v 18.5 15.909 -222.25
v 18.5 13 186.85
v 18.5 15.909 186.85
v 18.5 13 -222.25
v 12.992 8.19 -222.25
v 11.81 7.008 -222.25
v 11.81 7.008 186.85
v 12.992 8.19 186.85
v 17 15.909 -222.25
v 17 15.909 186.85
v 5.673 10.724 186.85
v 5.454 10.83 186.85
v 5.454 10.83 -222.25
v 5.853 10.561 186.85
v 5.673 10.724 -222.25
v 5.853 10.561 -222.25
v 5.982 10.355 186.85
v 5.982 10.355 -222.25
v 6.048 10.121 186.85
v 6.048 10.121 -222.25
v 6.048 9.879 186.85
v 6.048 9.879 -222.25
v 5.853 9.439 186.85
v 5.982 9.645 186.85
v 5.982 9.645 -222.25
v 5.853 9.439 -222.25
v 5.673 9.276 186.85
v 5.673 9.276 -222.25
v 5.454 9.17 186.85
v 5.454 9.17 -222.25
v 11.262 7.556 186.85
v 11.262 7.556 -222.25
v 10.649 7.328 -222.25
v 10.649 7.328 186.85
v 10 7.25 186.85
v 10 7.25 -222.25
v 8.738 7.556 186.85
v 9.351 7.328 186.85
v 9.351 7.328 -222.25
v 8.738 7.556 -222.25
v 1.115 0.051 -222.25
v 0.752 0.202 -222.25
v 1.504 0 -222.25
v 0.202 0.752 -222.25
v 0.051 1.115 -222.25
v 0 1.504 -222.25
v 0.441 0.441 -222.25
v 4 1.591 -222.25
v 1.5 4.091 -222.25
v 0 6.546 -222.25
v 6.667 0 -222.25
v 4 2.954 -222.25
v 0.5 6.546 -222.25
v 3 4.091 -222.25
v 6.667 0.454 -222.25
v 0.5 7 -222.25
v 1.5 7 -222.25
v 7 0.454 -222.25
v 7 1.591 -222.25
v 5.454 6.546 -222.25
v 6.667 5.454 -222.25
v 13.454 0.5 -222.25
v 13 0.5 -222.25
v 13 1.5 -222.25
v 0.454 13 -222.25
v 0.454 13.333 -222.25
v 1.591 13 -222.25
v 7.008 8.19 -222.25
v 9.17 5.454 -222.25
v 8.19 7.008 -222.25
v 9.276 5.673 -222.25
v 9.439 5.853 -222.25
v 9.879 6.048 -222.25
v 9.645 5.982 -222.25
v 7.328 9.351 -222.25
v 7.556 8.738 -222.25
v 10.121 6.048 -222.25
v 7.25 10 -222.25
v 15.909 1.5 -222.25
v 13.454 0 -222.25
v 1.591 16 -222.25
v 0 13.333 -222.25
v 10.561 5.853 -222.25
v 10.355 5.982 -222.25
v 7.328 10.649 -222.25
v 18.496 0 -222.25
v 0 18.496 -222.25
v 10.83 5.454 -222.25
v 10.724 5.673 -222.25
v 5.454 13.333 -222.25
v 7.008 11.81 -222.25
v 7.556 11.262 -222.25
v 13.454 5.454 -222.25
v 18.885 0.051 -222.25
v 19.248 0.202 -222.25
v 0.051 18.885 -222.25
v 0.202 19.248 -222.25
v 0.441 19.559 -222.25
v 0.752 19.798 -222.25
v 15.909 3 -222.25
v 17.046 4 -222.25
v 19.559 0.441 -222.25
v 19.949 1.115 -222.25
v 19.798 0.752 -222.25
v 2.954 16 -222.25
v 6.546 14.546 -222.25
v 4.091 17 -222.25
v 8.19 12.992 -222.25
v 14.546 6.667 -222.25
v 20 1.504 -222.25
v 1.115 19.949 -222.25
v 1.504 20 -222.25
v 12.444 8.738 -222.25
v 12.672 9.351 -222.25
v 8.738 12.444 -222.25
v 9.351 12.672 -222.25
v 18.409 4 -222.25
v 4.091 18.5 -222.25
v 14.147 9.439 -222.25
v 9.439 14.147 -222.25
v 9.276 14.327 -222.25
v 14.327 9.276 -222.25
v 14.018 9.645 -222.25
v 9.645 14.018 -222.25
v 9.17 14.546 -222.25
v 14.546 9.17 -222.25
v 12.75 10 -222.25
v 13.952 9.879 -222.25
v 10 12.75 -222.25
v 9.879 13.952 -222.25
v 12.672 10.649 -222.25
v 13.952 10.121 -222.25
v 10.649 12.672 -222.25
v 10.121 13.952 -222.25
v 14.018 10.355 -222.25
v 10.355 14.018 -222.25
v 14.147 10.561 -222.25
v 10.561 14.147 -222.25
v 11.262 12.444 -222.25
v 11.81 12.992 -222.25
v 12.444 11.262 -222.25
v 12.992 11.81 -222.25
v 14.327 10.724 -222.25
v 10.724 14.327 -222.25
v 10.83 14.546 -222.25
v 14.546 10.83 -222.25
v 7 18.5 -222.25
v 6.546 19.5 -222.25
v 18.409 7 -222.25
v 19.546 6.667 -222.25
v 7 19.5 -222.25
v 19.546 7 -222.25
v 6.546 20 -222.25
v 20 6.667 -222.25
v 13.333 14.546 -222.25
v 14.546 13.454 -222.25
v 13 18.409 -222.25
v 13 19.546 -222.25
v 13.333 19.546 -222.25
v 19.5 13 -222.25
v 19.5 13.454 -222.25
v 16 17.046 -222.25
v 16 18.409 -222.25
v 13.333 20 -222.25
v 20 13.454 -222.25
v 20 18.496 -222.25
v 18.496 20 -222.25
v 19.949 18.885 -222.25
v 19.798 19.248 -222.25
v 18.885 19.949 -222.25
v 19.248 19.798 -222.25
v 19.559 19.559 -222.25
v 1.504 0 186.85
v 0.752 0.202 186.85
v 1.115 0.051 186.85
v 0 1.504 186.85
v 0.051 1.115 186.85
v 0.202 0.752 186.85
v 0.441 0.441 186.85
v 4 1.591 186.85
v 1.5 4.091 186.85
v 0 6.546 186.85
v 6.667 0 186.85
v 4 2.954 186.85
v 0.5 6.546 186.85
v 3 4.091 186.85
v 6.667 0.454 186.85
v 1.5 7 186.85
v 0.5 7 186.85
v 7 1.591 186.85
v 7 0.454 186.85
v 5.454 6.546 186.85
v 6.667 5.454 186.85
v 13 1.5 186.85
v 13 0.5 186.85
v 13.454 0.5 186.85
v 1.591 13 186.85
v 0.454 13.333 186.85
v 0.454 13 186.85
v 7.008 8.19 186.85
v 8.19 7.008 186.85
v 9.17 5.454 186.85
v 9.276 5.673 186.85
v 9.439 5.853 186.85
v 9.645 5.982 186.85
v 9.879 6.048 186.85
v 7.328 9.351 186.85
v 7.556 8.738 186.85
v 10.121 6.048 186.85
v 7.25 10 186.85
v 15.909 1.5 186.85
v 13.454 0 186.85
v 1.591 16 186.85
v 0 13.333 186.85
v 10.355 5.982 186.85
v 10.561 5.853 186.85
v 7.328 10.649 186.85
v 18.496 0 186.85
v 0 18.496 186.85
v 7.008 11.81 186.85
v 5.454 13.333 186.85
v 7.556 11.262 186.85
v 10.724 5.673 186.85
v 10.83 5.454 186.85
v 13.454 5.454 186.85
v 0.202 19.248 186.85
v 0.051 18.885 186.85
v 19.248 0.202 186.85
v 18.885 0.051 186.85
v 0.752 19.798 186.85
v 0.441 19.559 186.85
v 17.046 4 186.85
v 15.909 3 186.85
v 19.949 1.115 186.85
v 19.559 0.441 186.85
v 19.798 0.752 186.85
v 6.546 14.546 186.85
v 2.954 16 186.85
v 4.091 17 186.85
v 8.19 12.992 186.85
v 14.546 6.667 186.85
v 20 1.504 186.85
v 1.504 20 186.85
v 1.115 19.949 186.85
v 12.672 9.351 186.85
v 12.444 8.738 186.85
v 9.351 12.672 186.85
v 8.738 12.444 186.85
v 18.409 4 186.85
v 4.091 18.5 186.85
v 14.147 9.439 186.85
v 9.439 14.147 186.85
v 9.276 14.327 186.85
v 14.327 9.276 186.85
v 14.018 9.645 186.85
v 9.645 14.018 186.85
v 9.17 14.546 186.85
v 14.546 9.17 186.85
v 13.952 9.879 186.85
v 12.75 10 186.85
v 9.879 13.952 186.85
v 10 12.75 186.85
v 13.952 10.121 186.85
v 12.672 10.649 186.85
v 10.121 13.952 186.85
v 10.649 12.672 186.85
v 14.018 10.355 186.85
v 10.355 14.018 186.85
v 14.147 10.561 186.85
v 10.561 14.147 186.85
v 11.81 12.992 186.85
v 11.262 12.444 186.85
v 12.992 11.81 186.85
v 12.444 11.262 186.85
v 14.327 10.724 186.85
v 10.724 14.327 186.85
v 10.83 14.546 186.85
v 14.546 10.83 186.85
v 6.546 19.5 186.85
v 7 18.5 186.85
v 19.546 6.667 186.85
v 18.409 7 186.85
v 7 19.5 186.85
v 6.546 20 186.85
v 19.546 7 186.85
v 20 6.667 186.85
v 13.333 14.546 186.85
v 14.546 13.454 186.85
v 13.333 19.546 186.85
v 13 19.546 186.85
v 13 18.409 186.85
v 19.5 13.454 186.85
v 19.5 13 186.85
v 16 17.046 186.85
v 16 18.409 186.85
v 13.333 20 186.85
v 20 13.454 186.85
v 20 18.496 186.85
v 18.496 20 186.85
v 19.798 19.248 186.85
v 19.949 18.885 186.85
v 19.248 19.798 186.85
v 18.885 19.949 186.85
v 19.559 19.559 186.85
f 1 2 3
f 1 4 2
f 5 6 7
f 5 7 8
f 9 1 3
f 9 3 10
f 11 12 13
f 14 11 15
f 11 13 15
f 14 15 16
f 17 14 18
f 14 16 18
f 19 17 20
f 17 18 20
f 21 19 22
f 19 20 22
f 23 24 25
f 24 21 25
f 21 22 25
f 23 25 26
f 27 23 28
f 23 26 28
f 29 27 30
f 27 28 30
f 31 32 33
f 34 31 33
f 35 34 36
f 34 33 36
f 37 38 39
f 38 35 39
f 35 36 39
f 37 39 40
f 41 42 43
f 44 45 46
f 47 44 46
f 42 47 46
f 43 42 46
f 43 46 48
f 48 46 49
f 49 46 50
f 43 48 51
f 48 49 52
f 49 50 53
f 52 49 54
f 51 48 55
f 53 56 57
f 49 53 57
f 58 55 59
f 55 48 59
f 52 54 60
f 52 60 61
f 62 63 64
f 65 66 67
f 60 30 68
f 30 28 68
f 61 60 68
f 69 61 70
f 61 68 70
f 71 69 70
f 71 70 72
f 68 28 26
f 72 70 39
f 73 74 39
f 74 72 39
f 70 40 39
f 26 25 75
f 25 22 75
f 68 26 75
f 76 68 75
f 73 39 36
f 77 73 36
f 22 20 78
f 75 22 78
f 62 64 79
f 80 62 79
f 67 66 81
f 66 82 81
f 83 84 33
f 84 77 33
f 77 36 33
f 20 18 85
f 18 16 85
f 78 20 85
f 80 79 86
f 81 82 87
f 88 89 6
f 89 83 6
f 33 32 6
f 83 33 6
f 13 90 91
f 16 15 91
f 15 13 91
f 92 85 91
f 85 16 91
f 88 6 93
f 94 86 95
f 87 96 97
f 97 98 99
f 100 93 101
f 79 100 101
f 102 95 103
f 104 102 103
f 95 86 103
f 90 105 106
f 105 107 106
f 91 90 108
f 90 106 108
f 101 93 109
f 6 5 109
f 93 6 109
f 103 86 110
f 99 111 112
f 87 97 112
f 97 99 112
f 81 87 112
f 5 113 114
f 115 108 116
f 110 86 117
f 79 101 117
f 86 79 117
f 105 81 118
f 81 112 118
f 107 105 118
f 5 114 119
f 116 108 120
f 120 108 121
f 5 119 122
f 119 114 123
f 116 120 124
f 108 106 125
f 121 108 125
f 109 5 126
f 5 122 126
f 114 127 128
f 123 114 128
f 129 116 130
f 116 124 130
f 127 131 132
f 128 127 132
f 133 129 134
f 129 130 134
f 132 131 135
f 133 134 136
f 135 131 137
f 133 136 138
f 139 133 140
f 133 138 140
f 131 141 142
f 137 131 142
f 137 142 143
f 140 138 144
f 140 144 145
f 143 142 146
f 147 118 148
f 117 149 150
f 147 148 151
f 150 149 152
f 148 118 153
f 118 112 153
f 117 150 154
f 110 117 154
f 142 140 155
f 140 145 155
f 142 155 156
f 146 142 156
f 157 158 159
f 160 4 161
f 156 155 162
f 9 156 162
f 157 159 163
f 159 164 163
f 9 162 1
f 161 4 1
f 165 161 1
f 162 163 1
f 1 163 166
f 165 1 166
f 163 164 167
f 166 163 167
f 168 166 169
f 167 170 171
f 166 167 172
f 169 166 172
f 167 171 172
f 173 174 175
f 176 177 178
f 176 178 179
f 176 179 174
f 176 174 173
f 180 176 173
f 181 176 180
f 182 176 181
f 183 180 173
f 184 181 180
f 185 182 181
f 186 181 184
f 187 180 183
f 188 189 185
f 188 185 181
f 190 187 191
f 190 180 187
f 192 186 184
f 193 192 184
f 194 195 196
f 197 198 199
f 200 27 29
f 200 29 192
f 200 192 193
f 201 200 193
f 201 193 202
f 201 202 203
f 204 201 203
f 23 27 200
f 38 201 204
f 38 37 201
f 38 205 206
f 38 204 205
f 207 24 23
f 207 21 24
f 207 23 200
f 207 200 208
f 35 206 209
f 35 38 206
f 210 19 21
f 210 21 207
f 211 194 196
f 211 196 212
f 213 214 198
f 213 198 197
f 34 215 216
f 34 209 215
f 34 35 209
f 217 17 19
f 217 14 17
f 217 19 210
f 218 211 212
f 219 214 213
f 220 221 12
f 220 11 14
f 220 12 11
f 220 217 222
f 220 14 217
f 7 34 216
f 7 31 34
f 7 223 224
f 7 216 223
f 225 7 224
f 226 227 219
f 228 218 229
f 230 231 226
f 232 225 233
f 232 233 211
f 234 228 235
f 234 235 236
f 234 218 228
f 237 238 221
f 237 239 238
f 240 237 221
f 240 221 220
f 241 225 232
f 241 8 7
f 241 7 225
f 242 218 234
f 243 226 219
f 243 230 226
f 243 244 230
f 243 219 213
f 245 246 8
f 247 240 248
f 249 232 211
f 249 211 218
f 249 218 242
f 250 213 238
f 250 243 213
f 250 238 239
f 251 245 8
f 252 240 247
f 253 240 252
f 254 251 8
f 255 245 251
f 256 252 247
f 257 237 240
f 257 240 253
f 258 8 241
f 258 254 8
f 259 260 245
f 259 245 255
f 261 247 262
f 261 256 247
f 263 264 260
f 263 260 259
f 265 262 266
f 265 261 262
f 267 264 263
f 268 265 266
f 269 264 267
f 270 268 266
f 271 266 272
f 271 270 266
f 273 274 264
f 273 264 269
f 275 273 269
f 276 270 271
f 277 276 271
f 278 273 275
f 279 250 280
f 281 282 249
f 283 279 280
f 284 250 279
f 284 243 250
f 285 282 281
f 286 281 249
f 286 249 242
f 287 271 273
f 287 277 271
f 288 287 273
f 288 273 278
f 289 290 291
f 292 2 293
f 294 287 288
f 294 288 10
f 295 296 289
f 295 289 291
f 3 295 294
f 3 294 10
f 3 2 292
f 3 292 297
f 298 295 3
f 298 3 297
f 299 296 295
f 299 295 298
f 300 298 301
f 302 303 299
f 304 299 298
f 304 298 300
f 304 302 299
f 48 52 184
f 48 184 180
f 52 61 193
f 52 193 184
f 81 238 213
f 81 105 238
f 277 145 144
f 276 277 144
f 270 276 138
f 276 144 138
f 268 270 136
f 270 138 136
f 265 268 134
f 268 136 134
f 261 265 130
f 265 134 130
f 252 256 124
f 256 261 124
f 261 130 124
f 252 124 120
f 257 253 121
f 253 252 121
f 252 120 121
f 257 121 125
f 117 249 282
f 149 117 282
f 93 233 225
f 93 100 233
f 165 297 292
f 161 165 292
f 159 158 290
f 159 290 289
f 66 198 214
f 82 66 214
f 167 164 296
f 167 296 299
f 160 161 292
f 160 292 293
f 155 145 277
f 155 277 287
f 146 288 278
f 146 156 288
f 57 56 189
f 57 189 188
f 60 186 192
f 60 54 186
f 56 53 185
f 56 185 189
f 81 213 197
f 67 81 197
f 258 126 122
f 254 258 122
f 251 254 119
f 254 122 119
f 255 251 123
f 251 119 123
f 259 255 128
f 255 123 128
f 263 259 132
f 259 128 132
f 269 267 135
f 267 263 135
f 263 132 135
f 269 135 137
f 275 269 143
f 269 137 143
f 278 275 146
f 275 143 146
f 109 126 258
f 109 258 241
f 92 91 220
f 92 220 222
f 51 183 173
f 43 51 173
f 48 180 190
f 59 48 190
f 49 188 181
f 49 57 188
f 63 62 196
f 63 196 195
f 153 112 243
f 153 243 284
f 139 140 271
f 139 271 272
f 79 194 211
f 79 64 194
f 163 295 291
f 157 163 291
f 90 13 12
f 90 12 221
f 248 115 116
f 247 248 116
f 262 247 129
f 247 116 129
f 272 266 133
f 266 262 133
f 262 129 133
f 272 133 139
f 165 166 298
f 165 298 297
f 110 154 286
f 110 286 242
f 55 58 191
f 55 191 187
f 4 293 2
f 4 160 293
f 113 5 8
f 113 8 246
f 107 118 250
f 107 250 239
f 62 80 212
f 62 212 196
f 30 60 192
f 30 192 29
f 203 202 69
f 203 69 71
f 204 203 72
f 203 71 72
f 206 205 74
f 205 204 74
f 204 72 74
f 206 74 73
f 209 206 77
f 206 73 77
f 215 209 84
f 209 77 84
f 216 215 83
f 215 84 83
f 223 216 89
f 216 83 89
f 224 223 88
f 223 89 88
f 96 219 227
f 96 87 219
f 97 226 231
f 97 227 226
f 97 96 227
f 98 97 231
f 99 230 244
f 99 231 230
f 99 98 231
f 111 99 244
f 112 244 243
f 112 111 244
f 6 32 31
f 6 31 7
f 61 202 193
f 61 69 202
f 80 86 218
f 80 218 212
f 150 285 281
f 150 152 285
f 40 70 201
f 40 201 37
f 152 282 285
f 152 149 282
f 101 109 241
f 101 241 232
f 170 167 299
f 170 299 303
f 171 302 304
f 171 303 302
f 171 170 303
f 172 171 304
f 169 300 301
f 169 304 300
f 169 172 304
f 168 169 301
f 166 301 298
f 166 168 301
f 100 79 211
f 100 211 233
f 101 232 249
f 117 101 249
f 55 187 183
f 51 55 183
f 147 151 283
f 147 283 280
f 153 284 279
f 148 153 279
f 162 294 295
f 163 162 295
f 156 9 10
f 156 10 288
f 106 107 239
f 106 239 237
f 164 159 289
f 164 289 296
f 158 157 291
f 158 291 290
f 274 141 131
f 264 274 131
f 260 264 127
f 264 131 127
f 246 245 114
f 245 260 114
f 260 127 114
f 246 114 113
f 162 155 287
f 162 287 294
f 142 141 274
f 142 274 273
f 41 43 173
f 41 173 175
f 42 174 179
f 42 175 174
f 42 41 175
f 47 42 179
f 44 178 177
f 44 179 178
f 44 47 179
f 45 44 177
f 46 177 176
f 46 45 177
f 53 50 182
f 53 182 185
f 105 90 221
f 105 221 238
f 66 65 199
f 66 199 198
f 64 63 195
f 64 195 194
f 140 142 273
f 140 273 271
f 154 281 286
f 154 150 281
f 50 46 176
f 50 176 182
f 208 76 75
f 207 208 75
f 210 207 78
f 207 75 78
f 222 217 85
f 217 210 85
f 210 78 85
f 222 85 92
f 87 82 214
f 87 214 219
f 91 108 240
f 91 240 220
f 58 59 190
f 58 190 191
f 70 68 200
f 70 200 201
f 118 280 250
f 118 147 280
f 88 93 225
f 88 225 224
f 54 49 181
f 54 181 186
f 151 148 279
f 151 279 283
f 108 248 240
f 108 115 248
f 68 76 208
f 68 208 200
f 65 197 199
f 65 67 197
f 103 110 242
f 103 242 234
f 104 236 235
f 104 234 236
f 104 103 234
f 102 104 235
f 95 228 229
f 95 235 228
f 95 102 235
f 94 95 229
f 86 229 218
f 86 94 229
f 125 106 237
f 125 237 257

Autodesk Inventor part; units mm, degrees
ref_plane "YZ Plane" through (0, 0, 0) normal (1, 0, 0) x (0, 1, 0)
ref_plane "XZ Plane" through (0, 0, 0) normal (0, 1, 0) x (-1, 0, 0)
ref_plane "XY Plane" through (0, 0, 0) normal (0, 0, 1) x (1, 0, 0)
sketch "Sketch1" plane through (0, 0, 0) normal (0, 0, 1) x (1, 0, 0)
  line L0 (11.2616, 7.5565) -> (11.8104, 7.0077)
  line L1 (11.8104, 7.0077) -> (12.9923, 8.1896)
  line L2 (12.9923, 8.1896) -> (12.4435, 8.7384)
  arc A0 (12.4435, 8.7384) -> (12.4435, 11.2616) centre (10, 10) ccw
  line L3 (12.4435, 11.2616) -> (12.9923, 11.8104)
  line L4 (12.9923, 11.8104) -> (11.8104, 12.9923)
  line L5 (11.8104, 12.9923) -> (11.2616, 12.4435)
  arc A1 (11.2616, 12.4435) -> (8.7384, 12.4435) centre (10, 10) ccw
  line L6 (8.7384, 12.4435) -> (8.1896, 12.9923)
  line L7 (8.1896, 12.9923) -> (7.0077, 11.8104)
  line L8 (7.0077, 11.8104) -> (7.5565, 11.2616)
  arc A2 (7.5565, 11.2616) -> (7.5565, 8.7384) centre (10, 10) ccw
  line L9 (7.5565, 8.7384) -> (7.0077, 8.1896)
  line L10 (7.0077, 8.1896) -> (8.1896, 7.0077)
  line L11 (8.1896, 7.0077) -> (8.7384, 7.5565)
  arc A3 (8.7384, 7.5565) -> (11.2616, 7.5565) centre (10, 10) ccw
  line L12 (13.4545, 0) -> (13.4545, 0.5)
  line L13 (13.4545, 0.5) -> (13, 0.5)
  line L14 (13, 0.5) -> (13, 1.5)
  line L15 (13, 1.5) -> (15.9091, 1.5)
  line L16 (15.9091, 1.5) -> (15.9091, 3)
  line L17 (15.9091, 3) -> (13.4545, 5.4545)
  line L18 (13.4545, 5.4545) -> (10.8302, 5.4545)
  arc A4 (10.8302, 5.4545) -> (9.1698, 5.4545) centre (10, 5.1837) ccw
  line L19 (9.1698, 5.4545) -> (6.6667, 5.4545)
  line L20 (6.6667, 5.4545) -> (4, 2.9545)
  line L21 (4, 2.9545) -> (4, 1.5909)
  line L22 (4, 1.5909) -> (7, 1.5909)
  line L23 (7, 1.5909) -> (7, 0.4545)
  line L24 (7, 0.4545) -> (6.6667, 0.4545)
  line L25 (6.6667, 0.4545) -> (6.6667, 0)
  line L26 (6.6667, 0) -> (1.5043, 0)
  arc A5 (0, 1.5043) -> (1.5043, 0) centre (1.5043, 1.5043) ccw
  line L27 (0, 1.5043) -> (0, 6.5455)
  line L28 (0, 6.5455) -> (0.5, 6.5455)
  line L29 (0.5, 6.5455) -> (0.5, 7)
  line L30 (0.5, 7) -> (1.5, 7)
  line L31 (1.5, 7) -> (1.5, 4.0909)
  line L32 (1.5, 4.0909) -> (3, 4.0909)
  line L33 (3, 4.0909) -> (5.4545, 6.5455)
  line L34 (5.4545, 6.5455) -> (5.4545, 9.1698)
  arc A6 (5.4545, 9.1698) -> (5.4545, 10.8302) centre (5.1837, 10) ccw
  line L35 (5.4545, 10.8302) -> (5.4545, 13.3333)
  line L36 (5.4545, 13.3333) -> (2.9545, 16)
  line L37 (2.9545, 16) -> (1.5909, 16)
  line L38 (1.5909, 16) -> (1.5909, 13)
  line L39 (1.5909, 13) -> (0.4545, 13)
  line L40 (0.4545, 13) -> (0.4545, 13.3333)
  line L41 (0.4545, 13.3333) -> (0, 13.3333)
  line L42 (0, 13.3333) -> (0, 18.4957)
  arc A7 (1.5043, 20) -> (0, 18.4957) centre (1.5043, 18.4957) ccw
  line L43 (1.5043, 20) -> (6.5455, 20)
  line L44 (6.5455, 20) -> (6.5455, 19.5)
  line L45 (6.5455, 19.5) -> (7, 19.5)
  line L46 (7, 19.5) -> (7, 18.5)
  line L47 (7, 18.5) -> (4.0909, 18.5)
  line L48 (4.0909, 18.5) -> (4.0909, 17)
  line L49 (4.0909, 17) -> (6.5455, 14.5455)
  line L50 (6.5455, 14.5455) -> (9.1698, 14.5455)
  arc A8 (9.1698, 14.5455) -> (10.8302, 14.5455) centre (10, 14.8163) ccw
  line L51 (10.8302, 14.5455) -> (13.3333, 14.5455)
  line L52 (13.3333, 14.5455) -> (16, 17.0455)
  line L53 (16, 17.0455) -> (16, 18.4091)
  line L54 (16, 18.4091) -> (13, 18.4091)
  line L55 (13, 18.4091) -> (13, 19.5455)
  line L56 (13, 19.5455) -> (13.3333, 19.5455)
  line L57 (13.3333, 19.5455) -> (13.3333, 20)
  line L58 (13.3333, 20) -> (18.4957, 20)
  arc A9 (20, 18.4957) -> (18.4957, 20) centre (18.4957, 18.4957) ccw
  line L59 (20, 18.4957) -> (20, 13.4545)
  line L60 (20, 13.4545) -> (19.5, 13.4545)
  line L61 (19.5, 13.4545) -> (19.5, 13)
  line L62 (19.5, 13) -> (18.5, 13)
  line L63 (18.5, 13) -> (18.5, 15.9091)
  line L64 (18.5, 15.9091) -> (17, 15.9091)
  line L65 (17, 15.9091) -> (14.5455, 13.4545)
  line L66 (14.5455, 13.4545) -> (14.5455, 10.8302)
  arc A10 (14.5455, 10.8302) -> (14.5455, 9.1698) centre (14.8163, 10) ccw
  line L67 (14.5455, 9.1698) -> (14.5455, 6.6667)
  line L68 (14.5455, 6.6667) -> (17.0455, 4)
  line L69 (17.0455, 4) -> (18.4091, 4)
  line L70 (18.4091, 4) -> (18.4091, 7)
  line L71 (18.4091, 7) -> (19.5455, 7)
  line L72 (19.5455, 7) -> (19.5455, 6.6667)
  line L73 (19.5455, 6.6667) -> (20, 6.6667)
  line L74 (20, 6.6667) -> (20, 1.5043)
  arc A11 (18.4957, 0) -> (20, 1.5043) centre (18.4957, 1.5043) ccw
  line L75 (18.4957, 0) -> (13.4545, 0)
  point P0 (0, 0)
  point P1 (0.4406, 0.4406)
  point P2 (10, 0)
  point P3 (10, 0)
  point P4 (10, 0)
  point P5 (19.5594, 0.4406)
  point P6 (0, 10)
  point P7 (0, 10)
  point P8 (0, 10)
  point P9 (10, 10)
  point P10 (20, 10)
  point P11 (20, 10)
  point P12 (20, 10)
  point P13 (0.4406, 19.5594)
  point P14 (10, 20)
  point P15 (10, 20)
  point P16 (10, 20)
  point P17 (19.5594, 19.5594)
extrude "Extrusion1" add sketch "Sketch1" along normal mid plane 444.5
sketch "Sketch3" plane through (0, 0, 222.25) normal (0, 0, 1) x (1, 0, 0)
  arc A0 (8.7384, 7.5565) -> (11.2616, 7.5565) centre (10, 10) ccw projected
  line L0 (8.7384, 7.5565) -> (8.1896, 7.0077) projected
  line L1 (8.1896, 7.0077) -> (7.0077, 8.1896) projected
  line L2 (7.0077, 8.1896) -> (7.5565, 8.7384) projected
  arc A1 (7.5565, 11.2616) -> (7.5565, 8.7384) centre (10, 10) ccw projected
  line L3 (7.5565, 11.2616) -> (7.0077, 11.8104) projected
  line L4 (7.0077, 11.8104) -> (8.1896, 12.9923) projected
  line L5 (8.1896, 12.9923) -> (8.7384, 12.4435) projected
  arc A2 (11.2616, 12.4435) -> (8.7384, 12.4435) centre (10, 10) ccw projected
  line L6 (11.2616, 12.4435) -> (11.8104, 12.9923) projected
  line L7 (11.8104, 12.9923) -> (12.9923, 11.8104) projected
  line L8 (12.9923, 11.8104) -> (12.4435, 11.2616) projected
  arc A3 (12.4435, 8.7384) -> (12.4435, 11.2616) centre (10, 10) ccw projected
  line L9 (12.4435, 8.7384) -> (12.9923, 8.1896) projected
  line L10 (12.9923, 8.1896) -> (11.8104, 7.0077) projected
  line L11 (11.8104, 7.0077) -> (11.2616, 7.5565) projected
  line L12 (13.4545, 5.4545) -> (10.8302, 5.4545) projected
  line L13 (15.9091, 3) -> (13.4545, 5.4545) projected
  line L14 (15.9091, 1.5) -> (15.9091, 3) projected
  line L15 (13, 1.5) -> (15.9091, 1.5) projected
  line L16 (13, 0.5) -> (13, 1.5) projected
  line L17 (13.4545, 0.5) -> (13, 0.5) projected
  line L18 (13.4545, 0) -> (13.4545, 0.5) projected
  line L19 (18.4957, 0) -> (13.4545, 0) projected
  arc A4 (18.4957, 0) -> (20, 1.5043) centre (18.4957, 1.5043) ccw projected
  line L20 (20, 6.6667) -> (20, 1.5043) projected
  line L21 (19.5455, 6.6667) -> (20, 6.6667) projected
  line L22 (19.5455, 7) -> (19.5455, 6.6667) projected
  line L23 (18.4091, 7) -> (19.5455, 7) projected
  line L24 (18.4091, 4) -> (18.4091, 7) projected
  line L25 (17.0455, 4) -> (18.4091, 4) projected
  line L26 (14.5455, 6.6667) -> (17.0455, 4) projected
  line L27 (14.5455, 9.1698) -> (14.5455, 6.6667) projected
  arc A5 (14.5455, 10.8302) -> (14.5455, 9.1698) centre (14.8163, 10) ccw projected
  line L28 (14.5455, 13.4545) -> (14.5455, 10.8302) projected
  line L29 (17, 15.9091) -> (14.5455, 13.4545) projected
  line L30 (18.5, 15.9091) -> (17, 15.9091) projected
  line L31 (18.5, 13) -> (18.5, 15.9091) projected
  line L32 (19.5, 13) -> (18.5, 13) projected
  line L33 (19.5, 13.4545) -> (19.5, 13) projected
  line L34 (20, 13.4545) -> (19.5, 13.4545) projected
  line L35 (20, 18.4957) -> (20, 13.4545) projected
  arc A6 (20, 18.4957) -> (18.4957, 20) centre (18.4957, 18.4957) ccw projected
  line L36 (13.3333, 20) -> (18.4957, 20) projected
  line L37 (13.3333, 19.5455) -> (13.3333, 20) projected
  line L38 (13, 19.5455) -> (13.3333, 19.5455) projected
  line L39 (13, 18.4091) -> (13, 19.5455) projected
  line L40 (16, 18.4091) -> (13, 18.4091) projected
  line L41 (16, 17.0455) -> (16, 18.4091) projected
  line L42 (13.3333, 14.5455) -> (16, 17.0455) projected
  line L43 (10.8302, 14.5455) -> (13.3333, 14.5455) projected
  arc A7 (9.1698, 14.5455) -> (10.8302, 14.5455) centre (10, 14.8163) ccw projected
  line L44 (6.5455, 14.5455) -> (9.1698, 14.5455) projected
  line L45 (4.0909, 17) -> (6.5455, 14.5455) projected
  line L46 (4.0909, 18.5) -> (4.0909, 17) projected
  line L47 (7, 18.5) -> (4.0909, 18.5) projected
  line L48 (7, 19.5) -> (7, 18.5) projected
  line L49 (6.5455, 19.5) -> (7, 19.5) projected
  line L50 (6.5455, 20) -> (6.5455, 19.5) projected
  line L51 (1.5043, 20) -> (6.5455, 20) projected
  arc A8 (1.5043, 20) -> (0, 18.4957) centre (1.5043, 18.4957) ccw projected
  line L52 (0, 13.3333) -> (0, 18.4957) projected
  line L53 (0.4545, 13.3333) -> (0, 13.3333) projected
  line L54 (0.4545, 13) -> (0.4545, 13.3333) projected
  line L55 (1.5909, 13) -> (0.4545, 13) projected
  line L56 (1.5909, 16) -> (1.5909, 13) projected
  line L57 (2.9545, 16) -> (1.5909, 16) projected
  line L58 (5.4545, 13.3333) -> (2.9545, 16) projected
  line L59 (5.4545, 10.8302) -> (5.4545, 13.3333) projected
  arc A9 (5.4545, 9.1698) -> (5.4545, 10.8302) centre (5.1837, 10) ccw projected
  line L60 (5.4545, 6.5455) -> (5.4545, 9.1698) projected
  line L61 (3, 4.0909) -> (5.4545, 6.5455) projected
  line L62 (1.5, 4.0909) -> (3, 4.0909) projected
  line L63 (1.5, 7) -> (1.5, 4.0909) projected
  line L64 (0.5, 7) -> (1.5, 7) projected
  line L65 (0.5, 6.5455) -> (0.5, 7) projected
  line L66 (0, 6.5455) -> (0.5, 6.5455) projected
  line L67 (0, 1.5043) -> (0, 6.5455) projected
  arc A10 (0, 1.5043) -> (1.5043, 0) centre (1.5043, 1.5043) ccw projected
  line L68 (6.6667, 0) -> (1.5043, 0) projected
  line L69 (6.6667, 0.4545) -> (6.6667, 0) projected
  line L70 (7, 0.4545) -> (6.6667, 0.4545) projected
  line L71 (7, 1.5909) -> (7, 0.4545) projected
  line L72 (4, 1.5909) -> (7, 1.5909) projected
  line L73 (4, 2.9545) -> (4, 1.5909) projected
  line L74 (6.6667, 5.4545) -> (4, 2.9545) projected
  line L75 (9.1698, 5.4545) -> (6.6667, 5.4545) projected
  arc A11 (10.8302, 5.4545) -> (9.1698, 5.4545) centre (10, 5.1837) ccw projected
  point P0 (0, 0)
extrude "Extrusion3" cut sketch "Sketch3" against normal blind 35.4
properties part number "Frame side"
